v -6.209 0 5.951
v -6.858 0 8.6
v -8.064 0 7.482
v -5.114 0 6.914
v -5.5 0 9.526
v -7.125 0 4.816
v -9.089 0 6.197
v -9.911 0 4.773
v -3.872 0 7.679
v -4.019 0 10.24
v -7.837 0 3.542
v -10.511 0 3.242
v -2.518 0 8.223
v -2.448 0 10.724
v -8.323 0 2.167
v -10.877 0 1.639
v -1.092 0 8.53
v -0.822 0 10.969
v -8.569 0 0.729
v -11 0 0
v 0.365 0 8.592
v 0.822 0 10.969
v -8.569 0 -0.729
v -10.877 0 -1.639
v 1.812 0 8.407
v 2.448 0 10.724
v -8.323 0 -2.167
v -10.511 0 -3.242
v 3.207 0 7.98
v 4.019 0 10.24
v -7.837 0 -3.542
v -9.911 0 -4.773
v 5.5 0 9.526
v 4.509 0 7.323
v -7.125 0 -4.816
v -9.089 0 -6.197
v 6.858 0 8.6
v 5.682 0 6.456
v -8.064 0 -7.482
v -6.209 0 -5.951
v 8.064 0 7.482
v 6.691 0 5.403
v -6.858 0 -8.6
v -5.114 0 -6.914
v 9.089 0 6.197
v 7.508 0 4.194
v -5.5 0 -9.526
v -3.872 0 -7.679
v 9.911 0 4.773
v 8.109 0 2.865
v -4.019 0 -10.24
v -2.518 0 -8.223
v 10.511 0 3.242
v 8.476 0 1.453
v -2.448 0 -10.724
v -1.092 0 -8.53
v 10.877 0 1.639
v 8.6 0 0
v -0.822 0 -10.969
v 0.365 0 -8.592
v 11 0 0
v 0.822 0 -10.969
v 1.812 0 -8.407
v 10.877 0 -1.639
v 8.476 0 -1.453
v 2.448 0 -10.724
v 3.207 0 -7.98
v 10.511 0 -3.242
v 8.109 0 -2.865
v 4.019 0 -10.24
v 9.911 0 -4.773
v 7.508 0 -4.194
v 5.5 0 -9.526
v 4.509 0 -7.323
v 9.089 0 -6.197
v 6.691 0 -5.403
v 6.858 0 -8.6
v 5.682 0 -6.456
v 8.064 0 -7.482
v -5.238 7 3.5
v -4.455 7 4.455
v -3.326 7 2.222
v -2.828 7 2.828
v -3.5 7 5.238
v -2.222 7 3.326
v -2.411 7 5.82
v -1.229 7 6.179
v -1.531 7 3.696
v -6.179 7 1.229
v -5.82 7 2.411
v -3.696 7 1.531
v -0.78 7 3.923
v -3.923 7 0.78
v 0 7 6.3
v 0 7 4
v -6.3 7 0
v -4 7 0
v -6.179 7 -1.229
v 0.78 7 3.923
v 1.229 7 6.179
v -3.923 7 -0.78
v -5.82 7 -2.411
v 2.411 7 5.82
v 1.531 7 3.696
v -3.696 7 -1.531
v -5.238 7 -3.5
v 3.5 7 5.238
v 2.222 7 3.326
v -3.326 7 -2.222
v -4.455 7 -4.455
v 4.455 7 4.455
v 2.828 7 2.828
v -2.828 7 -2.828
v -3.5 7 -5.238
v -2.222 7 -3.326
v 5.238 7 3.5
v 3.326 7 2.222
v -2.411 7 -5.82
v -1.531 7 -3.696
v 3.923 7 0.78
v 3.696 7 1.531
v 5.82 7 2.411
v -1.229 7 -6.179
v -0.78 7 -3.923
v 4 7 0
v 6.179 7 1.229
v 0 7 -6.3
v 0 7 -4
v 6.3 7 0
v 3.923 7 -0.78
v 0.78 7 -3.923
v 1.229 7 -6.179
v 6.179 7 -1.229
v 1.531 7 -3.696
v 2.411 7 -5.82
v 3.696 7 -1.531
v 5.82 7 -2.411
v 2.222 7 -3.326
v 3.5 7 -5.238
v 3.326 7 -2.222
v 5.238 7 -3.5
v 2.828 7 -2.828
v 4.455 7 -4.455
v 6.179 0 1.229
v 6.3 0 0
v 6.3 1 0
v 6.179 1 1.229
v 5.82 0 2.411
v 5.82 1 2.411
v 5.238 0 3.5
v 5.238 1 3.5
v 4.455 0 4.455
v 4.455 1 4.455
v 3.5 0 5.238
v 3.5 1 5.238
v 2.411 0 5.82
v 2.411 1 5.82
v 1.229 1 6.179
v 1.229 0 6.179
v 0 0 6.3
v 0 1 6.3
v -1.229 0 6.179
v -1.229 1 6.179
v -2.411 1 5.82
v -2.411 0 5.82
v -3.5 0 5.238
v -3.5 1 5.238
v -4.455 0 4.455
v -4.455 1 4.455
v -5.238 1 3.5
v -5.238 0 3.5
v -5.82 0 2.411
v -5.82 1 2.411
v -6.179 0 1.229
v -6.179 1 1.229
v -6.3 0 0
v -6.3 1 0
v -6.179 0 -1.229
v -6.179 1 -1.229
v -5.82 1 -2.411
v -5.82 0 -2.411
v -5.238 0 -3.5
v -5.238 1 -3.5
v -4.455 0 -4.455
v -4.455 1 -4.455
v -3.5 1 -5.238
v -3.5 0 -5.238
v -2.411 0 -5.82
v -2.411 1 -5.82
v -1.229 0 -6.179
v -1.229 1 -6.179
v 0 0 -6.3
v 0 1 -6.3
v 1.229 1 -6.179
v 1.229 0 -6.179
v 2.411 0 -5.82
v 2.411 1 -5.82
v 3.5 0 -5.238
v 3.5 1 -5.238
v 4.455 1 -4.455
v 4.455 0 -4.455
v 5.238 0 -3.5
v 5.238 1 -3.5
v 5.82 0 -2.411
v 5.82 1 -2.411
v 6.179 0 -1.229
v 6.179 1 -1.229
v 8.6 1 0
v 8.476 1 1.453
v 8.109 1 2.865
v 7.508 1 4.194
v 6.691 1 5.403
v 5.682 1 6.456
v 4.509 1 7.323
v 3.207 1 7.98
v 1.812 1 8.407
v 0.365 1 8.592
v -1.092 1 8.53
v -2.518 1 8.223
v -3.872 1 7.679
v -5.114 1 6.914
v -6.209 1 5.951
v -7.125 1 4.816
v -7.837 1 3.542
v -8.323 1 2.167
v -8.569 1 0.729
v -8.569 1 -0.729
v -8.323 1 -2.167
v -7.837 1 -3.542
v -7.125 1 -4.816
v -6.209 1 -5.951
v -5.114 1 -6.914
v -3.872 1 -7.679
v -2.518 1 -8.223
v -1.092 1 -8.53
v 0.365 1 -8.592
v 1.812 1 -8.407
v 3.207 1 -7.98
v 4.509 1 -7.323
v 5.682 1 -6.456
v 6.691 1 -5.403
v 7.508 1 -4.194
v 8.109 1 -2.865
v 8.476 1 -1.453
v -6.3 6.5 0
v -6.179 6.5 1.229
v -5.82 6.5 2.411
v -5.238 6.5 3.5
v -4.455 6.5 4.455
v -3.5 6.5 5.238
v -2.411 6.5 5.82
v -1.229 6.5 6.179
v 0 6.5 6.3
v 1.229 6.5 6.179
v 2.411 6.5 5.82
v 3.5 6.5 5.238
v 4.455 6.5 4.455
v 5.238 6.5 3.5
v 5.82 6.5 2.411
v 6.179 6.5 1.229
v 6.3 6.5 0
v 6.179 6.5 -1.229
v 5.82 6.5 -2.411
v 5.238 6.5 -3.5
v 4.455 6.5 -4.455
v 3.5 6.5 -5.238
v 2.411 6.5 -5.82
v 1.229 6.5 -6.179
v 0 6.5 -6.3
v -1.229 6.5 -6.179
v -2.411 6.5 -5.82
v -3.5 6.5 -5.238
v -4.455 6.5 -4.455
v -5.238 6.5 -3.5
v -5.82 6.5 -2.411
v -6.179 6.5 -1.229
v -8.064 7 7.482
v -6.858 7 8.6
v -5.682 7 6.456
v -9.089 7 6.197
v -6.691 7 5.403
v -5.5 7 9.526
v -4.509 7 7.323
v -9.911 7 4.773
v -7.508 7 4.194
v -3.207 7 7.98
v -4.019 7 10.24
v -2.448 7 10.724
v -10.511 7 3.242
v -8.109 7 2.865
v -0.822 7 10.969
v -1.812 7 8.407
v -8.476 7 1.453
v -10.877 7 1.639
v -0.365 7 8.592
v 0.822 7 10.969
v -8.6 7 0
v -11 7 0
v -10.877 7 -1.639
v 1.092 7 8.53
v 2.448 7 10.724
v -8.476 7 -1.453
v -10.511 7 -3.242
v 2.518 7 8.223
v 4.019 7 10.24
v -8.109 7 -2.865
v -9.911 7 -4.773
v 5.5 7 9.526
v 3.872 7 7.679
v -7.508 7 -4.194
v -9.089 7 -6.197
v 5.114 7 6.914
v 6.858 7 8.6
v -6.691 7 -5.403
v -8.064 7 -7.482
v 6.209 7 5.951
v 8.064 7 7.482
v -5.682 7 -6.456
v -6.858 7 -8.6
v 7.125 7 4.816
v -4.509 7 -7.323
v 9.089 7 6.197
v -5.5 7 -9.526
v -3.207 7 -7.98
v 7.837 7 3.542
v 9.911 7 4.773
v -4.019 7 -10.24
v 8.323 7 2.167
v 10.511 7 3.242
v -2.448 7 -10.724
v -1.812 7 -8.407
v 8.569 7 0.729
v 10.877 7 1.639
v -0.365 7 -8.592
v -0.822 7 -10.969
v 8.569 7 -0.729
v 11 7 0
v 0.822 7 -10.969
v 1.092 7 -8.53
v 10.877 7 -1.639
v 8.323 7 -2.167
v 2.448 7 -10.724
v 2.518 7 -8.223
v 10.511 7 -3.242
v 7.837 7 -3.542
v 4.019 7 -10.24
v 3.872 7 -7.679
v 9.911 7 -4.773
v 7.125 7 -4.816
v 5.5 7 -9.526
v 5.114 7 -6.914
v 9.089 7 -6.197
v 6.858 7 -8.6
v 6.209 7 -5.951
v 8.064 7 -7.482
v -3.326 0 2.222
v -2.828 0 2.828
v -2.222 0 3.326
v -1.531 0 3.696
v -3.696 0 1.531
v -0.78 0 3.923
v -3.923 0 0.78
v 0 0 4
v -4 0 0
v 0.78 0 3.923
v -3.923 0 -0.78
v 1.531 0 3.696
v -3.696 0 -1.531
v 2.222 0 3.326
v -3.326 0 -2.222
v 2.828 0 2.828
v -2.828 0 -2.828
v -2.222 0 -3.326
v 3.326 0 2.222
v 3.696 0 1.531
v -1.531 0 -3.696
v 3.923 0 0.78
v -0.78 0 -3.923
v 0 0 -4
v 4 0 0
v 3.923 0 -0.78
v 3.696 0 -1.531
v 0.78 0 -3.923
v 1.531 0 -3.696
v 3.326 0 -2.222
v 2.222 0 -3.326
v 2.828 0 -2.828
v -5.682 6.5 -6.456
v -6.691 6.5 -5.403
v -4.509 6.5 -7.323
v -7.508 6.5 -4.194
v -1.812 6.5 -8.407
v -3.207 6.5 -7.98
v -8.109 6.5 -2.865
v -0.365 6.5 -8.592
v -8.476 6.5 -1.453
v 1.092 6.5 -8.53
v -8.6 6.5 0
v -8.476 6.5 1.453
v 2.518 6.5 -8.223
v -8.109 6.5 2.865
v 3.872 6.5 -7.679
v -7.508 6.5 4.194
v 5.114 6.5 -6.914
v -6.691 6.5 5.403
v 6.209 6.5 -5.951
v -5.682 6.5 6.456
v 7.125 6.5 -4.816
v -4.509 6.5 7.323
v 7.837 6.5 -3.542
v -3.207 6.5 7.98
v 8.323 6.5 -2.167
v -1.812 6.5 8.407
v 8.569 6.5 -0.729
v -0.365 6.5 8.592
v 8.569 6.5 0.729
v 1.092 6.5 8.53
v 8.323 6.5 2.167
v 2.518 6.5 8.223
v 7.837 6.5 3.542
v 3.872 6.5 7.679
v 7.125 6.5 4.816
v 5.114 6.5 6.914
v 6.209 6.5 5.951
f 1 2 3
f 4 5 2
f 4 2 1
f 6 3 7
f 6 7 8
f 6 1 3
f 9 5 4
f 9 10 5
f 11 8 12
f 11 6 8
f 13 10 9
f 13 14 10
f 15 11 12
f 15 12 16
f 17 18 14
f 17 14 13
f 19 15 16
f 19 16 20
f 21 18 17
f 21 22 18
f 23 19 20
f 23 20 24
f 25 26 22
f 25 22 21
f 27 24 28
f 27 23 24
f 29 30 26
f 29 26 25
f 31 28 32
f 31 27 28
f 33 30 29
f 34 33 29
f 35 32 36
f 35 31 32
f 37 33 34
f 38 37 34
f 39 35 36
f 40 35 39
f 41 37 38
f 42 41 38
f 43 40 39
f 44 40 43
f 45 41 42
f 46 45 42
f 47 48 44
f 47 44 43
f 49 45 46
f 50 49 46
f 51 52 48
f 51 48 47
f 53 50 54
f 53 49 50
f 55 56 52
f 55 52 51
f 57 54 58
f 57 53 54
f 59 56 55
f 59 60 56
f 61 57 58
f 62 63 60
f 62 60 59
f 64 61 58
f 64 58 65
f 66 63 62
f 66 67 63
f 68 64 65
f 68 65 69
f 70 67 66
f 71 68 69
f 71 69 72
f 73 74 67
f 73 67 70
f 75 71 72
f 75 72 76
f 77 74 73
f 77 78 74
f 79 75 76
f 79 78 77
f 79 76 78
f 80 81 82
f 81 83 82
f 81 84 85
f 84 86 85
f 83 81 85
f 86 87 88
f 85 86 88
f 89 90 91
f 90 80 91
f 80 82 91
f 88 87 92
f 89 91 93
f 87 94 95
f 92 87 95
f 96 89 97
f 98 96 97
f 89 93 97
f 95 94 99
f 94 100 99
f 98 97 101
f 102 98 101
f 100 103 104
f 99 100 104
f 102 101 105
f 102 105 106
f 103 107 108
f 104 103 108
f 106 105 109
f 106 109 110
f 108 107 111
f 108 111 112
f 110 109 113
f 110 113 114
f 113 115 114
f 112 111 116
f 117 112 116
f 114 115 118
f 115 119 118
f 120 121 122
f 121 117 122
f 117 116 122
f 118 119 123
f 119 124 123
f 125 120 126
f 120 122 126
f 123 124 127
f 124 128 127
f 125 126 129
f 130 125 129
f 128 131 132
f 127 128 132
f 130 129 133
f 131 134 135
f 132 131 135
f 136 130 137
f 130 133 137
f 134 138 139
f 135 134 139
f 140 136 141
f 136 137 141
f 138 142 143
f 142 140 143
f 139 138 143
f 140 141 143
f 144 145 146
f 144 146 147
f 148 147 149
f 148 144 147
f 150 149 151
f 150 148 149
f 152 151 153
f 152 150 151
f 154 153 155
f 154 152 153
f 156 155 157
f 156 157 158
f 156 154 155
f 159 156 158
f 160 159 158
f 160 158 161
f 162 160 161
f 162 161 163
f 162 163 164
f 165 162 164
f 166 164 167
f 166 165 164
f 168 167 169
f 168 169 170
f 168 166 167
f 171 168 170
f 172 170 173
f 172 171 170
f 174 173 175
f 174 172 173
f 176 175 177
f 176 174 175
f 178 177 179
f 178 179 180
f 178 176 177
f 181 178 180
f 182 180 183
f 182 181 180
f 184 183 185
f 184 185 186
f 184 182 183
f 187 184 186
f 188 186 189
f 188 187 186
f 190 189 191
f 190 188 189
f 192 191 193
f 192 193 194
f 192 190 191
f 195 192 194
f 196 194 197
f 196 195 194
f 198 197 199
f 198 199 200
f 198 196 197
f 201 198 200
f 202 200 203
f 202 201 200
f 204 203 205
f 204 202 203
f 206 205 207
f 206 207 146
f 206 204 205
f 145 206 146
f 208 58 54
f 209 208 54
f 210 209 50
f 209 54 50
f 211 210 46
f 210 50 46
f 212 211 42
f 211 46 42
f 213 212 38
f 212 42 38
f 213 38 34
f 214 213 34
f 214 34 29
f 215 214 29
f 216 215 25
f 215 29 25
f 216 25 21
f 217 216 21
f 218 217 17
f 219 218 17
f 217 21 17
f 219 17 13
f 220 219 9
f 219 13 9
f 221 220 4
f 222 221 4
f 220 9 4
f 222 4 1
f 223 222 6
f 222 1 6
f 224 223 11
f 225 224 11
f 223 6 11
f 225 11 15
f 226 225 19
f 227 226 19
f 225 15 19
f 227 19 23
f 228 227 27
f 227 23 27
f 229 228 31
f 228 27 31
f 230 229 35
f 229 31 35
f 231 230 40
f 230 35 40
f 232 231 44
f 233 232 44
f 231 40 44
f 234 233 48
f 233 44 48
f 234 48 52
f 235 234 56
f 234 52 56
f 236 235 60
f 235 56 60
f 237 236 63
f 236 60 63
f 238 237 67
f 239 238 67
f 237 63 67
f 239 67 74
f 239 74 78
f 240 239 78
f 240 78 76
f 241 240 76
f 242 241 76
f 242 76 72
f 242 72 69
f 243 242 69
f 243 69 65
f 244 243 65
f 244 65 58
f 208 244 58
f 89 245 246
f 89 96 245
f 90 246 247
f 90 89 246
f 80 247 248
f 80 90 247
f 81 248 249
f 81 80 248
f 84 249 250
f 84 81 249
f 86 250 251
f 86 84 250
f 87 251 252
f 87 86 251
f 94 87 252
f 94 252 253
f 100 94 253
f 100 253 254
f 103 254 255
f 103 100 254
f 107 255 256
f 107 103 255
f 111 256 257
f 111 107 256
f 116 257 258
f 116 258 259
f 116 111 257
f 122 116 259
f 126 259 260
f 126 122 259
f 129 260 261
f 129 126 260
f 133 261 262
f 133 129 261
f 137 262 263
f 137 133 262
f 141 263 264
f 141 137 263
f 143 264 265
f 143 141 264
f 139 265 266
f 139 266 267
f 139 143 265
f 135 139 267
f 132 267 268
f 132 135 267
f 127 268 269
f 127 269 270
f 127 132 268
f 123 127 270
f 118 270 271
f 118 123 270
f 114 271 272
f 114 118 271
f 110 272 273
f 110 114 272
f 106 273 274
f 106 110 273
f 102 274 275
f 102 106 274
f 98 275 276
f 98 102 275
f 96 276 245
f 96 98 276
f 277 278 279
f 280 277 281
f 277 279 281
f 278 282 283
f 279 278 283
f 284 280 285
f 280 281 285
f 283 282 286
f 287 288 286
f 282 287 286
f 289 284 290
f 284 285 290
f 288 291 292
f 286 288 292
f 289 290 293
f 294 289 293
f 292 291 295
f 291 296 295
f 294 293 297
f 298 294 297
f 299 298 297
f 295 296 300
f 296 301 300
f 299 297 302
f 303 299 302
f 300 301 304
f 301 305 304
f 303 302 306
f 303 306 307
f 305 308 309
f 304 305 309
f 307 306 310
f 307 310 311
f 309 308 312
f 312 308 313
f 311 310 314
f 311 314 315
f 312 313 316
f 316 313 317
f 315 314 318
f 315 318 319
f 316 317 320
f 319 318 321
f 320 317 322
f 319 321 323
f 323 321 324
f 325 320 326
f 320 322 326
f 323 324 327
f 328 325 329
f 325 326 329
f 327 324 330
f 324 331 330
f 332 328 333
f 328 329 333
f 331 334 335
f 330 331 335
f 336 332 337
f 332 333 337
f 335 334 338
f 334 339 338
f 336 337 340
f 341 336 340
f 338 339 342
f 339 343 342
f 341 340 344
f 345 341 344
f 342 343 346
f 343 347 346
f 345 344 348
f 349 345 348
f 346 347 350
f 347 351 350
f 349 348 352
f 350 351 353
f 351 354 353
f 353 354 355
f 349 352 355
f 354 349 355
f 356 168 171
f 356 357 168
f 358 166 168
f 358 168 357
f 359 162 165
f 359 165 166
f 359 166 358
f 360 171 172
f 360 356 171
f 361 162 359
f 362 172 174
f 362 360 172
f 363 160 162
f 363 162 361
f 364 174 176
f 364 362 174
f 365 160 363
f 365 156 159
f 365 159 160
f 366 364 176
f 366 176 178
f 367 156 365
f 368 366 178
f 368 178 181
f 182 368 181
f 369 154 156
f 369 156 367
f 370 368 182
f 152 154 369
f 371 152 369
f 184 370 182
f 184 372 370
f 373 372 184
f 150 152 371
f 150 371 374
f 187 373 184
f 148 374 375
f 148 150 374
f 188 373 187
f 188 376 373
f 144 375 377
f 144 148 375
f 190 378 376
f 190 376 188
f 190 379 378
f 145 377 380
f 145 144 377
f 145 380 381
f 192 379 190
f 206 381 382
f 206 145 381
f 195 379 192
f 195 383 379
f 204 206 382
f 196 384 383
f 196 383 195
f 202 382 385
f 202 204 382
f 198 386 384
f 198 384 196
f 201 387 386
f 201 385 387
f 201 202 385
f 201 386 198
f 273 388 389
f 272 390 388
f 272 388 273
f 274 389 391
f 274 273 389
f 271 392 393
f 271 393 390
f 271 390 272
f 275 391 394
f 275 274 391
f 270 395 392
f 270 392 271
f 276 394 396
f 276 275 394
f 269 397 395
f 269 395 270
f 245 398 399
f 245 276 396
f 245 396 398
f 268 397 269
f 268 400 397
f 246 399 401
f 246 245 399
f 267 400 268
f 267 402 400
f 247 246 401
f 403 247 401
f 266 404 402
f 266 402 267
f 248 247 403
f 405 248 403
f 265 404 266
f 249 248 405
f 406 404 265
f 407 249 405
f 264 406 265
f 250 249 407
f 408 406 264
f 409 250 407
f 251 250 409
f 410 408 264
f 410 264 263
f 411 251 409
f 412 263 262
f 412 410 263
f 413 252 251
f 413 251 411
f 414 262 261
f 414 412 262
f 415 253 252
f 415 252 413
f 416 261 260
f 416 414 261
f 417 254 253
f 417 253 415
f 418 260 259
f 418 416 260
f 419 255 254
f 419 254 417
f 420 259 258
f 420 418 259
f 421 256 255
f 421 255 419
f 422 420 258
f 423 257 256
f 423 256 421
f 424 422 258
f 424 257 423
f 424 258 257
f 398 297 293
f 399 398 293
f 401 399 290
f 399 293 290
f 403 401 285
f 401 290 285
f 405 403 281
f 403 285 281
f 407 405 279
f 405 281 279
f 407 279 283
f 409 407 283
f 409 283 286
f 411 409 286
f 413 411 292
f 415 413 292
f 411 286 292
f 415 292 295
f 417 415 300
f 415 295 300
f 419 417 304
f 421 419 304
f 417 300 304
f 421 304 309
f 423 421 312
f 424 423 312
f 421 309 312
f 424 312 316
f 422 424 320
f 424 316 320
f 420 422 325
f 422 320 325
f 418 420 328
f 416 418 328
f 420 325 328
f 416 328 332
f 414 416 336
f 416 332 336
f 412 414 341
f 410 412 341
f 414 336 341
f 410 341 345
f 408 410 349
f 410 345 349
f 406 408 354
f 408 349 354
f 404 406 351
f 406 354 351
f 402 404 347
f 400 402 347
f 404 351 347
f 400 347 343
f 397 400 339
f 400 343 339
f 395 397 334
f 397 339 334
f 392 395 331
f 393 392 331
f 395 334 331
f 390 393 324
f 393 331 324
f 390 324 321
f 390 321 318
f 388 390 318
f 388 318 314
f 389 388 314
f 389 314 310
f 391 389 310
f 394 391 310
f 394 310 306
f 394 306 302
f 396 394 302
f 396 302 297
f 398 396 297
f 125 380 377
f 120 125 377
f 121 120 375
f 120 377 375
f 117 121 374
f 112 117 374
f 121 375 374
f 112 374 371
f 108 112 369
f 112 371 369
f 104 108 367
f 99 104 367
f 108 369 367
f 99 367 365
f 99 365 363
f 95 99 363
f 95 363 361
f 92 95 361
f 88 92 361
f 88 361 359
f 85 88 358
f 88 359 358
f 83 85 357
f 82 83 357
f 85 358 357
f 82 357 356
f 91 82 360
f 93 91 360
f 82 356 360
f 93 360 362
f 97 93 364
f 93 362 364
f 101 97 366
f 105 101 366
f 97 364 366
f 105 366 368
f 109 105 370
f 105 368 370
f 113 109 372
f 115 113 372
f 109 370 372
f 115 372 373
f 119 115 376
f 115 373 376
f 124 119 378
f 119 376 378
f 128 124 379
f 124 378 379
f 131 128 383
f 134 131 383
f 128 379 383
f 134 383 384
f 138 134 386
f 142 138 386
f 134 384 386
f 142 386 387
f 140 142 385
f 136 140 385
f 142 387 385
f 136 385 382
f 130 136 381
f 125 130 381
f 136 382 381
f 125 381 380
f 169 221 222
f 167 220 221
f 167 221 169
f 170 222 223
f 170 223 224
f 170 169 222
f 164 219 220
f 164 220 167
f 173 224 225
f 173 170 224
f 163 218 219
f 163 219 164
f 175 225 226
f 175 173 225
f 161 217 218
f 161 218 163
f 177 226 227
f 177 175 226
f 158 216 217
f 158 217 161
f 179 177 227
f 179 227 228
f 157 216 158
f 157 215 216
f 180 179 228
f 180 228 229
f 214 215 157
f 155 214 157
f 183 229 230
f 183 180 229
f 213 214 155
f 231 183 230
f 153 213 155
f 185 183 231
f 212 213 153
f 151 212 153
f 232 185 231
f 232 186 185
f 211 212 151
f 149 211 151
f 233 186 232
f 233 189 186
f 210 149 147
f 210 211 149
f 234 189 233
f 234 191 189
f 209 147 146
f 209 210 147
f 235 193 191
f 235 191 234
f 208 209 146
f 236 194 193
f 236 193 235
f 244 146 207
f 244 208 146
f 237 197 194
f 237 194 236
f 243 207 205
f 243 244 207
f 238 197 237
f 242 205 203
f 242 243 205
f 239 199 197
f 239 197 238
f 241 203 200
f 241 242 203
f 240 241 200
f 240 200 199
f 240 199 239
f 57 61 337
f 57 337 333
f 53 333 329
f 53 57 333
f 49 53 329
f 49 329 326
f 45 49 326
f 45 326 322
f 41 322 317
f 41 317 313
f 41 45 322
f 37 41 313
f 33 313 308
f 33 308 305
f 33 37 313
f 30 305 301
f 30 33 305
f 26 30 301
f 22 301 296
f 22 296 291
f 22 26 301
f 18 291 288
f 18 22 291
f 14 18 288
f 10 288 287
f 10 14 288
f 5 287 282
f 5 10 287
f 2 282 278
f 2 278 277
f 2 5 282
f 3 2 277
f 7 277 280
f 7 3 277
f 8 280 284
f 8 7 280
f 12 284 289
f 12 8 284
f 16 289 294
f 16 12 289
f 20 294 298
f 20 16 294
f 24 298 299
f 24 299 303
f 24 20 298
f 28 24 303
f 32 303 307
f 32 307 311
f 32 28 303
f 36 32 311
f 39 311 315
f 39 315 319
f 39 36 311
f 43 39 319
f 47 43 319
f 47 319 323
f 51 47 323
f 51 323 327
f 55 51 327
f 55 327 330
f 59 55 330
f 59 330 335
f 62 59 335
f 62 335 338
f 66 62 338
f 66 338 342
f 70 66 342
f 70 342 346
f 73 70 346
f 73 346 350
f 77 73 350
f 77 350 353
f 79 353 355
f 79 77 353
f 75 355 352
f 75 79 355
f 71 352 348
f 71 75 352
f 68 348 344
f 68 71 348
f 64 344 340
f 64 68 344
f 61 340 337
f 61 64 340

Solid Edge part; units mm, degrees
sketch "Sketch1" plane through (0, 0, 0) normal (0, -1, 0) x (1, 0, 0)
  circle A0 centre (0, 0) radius 11
  circle A1 centre (0, 0) radius 4
  dimension "D1" = 8
  dimension "D2" = 22
extrude "Protrusion1" add sketch "Sketch1" against normal blind 7
sketch "Sketch2" plane through (0, 0, 0) normal (0, -1, 0) x (1, 0, 0)
  circle A0 centre (0, 0) radius 8.6
  circle A1 centre (0, 0) radius 6.3
extrude "ExtrudedCutout_1" cut sketch "Sketch2" against normal blind 1
sketch "Sketch3" plane through (0, 7, 0) normal (0, 1, 0) x (-1, 0, 0)
  circle A0 centre (0, 0) radius 8.6
  circle A1 centre (0, 0) radius 6.3
extrude "ExtrudedCutout_3" cut sketch "Sketch3" against normal blind 0.5
properties material "Steel"
